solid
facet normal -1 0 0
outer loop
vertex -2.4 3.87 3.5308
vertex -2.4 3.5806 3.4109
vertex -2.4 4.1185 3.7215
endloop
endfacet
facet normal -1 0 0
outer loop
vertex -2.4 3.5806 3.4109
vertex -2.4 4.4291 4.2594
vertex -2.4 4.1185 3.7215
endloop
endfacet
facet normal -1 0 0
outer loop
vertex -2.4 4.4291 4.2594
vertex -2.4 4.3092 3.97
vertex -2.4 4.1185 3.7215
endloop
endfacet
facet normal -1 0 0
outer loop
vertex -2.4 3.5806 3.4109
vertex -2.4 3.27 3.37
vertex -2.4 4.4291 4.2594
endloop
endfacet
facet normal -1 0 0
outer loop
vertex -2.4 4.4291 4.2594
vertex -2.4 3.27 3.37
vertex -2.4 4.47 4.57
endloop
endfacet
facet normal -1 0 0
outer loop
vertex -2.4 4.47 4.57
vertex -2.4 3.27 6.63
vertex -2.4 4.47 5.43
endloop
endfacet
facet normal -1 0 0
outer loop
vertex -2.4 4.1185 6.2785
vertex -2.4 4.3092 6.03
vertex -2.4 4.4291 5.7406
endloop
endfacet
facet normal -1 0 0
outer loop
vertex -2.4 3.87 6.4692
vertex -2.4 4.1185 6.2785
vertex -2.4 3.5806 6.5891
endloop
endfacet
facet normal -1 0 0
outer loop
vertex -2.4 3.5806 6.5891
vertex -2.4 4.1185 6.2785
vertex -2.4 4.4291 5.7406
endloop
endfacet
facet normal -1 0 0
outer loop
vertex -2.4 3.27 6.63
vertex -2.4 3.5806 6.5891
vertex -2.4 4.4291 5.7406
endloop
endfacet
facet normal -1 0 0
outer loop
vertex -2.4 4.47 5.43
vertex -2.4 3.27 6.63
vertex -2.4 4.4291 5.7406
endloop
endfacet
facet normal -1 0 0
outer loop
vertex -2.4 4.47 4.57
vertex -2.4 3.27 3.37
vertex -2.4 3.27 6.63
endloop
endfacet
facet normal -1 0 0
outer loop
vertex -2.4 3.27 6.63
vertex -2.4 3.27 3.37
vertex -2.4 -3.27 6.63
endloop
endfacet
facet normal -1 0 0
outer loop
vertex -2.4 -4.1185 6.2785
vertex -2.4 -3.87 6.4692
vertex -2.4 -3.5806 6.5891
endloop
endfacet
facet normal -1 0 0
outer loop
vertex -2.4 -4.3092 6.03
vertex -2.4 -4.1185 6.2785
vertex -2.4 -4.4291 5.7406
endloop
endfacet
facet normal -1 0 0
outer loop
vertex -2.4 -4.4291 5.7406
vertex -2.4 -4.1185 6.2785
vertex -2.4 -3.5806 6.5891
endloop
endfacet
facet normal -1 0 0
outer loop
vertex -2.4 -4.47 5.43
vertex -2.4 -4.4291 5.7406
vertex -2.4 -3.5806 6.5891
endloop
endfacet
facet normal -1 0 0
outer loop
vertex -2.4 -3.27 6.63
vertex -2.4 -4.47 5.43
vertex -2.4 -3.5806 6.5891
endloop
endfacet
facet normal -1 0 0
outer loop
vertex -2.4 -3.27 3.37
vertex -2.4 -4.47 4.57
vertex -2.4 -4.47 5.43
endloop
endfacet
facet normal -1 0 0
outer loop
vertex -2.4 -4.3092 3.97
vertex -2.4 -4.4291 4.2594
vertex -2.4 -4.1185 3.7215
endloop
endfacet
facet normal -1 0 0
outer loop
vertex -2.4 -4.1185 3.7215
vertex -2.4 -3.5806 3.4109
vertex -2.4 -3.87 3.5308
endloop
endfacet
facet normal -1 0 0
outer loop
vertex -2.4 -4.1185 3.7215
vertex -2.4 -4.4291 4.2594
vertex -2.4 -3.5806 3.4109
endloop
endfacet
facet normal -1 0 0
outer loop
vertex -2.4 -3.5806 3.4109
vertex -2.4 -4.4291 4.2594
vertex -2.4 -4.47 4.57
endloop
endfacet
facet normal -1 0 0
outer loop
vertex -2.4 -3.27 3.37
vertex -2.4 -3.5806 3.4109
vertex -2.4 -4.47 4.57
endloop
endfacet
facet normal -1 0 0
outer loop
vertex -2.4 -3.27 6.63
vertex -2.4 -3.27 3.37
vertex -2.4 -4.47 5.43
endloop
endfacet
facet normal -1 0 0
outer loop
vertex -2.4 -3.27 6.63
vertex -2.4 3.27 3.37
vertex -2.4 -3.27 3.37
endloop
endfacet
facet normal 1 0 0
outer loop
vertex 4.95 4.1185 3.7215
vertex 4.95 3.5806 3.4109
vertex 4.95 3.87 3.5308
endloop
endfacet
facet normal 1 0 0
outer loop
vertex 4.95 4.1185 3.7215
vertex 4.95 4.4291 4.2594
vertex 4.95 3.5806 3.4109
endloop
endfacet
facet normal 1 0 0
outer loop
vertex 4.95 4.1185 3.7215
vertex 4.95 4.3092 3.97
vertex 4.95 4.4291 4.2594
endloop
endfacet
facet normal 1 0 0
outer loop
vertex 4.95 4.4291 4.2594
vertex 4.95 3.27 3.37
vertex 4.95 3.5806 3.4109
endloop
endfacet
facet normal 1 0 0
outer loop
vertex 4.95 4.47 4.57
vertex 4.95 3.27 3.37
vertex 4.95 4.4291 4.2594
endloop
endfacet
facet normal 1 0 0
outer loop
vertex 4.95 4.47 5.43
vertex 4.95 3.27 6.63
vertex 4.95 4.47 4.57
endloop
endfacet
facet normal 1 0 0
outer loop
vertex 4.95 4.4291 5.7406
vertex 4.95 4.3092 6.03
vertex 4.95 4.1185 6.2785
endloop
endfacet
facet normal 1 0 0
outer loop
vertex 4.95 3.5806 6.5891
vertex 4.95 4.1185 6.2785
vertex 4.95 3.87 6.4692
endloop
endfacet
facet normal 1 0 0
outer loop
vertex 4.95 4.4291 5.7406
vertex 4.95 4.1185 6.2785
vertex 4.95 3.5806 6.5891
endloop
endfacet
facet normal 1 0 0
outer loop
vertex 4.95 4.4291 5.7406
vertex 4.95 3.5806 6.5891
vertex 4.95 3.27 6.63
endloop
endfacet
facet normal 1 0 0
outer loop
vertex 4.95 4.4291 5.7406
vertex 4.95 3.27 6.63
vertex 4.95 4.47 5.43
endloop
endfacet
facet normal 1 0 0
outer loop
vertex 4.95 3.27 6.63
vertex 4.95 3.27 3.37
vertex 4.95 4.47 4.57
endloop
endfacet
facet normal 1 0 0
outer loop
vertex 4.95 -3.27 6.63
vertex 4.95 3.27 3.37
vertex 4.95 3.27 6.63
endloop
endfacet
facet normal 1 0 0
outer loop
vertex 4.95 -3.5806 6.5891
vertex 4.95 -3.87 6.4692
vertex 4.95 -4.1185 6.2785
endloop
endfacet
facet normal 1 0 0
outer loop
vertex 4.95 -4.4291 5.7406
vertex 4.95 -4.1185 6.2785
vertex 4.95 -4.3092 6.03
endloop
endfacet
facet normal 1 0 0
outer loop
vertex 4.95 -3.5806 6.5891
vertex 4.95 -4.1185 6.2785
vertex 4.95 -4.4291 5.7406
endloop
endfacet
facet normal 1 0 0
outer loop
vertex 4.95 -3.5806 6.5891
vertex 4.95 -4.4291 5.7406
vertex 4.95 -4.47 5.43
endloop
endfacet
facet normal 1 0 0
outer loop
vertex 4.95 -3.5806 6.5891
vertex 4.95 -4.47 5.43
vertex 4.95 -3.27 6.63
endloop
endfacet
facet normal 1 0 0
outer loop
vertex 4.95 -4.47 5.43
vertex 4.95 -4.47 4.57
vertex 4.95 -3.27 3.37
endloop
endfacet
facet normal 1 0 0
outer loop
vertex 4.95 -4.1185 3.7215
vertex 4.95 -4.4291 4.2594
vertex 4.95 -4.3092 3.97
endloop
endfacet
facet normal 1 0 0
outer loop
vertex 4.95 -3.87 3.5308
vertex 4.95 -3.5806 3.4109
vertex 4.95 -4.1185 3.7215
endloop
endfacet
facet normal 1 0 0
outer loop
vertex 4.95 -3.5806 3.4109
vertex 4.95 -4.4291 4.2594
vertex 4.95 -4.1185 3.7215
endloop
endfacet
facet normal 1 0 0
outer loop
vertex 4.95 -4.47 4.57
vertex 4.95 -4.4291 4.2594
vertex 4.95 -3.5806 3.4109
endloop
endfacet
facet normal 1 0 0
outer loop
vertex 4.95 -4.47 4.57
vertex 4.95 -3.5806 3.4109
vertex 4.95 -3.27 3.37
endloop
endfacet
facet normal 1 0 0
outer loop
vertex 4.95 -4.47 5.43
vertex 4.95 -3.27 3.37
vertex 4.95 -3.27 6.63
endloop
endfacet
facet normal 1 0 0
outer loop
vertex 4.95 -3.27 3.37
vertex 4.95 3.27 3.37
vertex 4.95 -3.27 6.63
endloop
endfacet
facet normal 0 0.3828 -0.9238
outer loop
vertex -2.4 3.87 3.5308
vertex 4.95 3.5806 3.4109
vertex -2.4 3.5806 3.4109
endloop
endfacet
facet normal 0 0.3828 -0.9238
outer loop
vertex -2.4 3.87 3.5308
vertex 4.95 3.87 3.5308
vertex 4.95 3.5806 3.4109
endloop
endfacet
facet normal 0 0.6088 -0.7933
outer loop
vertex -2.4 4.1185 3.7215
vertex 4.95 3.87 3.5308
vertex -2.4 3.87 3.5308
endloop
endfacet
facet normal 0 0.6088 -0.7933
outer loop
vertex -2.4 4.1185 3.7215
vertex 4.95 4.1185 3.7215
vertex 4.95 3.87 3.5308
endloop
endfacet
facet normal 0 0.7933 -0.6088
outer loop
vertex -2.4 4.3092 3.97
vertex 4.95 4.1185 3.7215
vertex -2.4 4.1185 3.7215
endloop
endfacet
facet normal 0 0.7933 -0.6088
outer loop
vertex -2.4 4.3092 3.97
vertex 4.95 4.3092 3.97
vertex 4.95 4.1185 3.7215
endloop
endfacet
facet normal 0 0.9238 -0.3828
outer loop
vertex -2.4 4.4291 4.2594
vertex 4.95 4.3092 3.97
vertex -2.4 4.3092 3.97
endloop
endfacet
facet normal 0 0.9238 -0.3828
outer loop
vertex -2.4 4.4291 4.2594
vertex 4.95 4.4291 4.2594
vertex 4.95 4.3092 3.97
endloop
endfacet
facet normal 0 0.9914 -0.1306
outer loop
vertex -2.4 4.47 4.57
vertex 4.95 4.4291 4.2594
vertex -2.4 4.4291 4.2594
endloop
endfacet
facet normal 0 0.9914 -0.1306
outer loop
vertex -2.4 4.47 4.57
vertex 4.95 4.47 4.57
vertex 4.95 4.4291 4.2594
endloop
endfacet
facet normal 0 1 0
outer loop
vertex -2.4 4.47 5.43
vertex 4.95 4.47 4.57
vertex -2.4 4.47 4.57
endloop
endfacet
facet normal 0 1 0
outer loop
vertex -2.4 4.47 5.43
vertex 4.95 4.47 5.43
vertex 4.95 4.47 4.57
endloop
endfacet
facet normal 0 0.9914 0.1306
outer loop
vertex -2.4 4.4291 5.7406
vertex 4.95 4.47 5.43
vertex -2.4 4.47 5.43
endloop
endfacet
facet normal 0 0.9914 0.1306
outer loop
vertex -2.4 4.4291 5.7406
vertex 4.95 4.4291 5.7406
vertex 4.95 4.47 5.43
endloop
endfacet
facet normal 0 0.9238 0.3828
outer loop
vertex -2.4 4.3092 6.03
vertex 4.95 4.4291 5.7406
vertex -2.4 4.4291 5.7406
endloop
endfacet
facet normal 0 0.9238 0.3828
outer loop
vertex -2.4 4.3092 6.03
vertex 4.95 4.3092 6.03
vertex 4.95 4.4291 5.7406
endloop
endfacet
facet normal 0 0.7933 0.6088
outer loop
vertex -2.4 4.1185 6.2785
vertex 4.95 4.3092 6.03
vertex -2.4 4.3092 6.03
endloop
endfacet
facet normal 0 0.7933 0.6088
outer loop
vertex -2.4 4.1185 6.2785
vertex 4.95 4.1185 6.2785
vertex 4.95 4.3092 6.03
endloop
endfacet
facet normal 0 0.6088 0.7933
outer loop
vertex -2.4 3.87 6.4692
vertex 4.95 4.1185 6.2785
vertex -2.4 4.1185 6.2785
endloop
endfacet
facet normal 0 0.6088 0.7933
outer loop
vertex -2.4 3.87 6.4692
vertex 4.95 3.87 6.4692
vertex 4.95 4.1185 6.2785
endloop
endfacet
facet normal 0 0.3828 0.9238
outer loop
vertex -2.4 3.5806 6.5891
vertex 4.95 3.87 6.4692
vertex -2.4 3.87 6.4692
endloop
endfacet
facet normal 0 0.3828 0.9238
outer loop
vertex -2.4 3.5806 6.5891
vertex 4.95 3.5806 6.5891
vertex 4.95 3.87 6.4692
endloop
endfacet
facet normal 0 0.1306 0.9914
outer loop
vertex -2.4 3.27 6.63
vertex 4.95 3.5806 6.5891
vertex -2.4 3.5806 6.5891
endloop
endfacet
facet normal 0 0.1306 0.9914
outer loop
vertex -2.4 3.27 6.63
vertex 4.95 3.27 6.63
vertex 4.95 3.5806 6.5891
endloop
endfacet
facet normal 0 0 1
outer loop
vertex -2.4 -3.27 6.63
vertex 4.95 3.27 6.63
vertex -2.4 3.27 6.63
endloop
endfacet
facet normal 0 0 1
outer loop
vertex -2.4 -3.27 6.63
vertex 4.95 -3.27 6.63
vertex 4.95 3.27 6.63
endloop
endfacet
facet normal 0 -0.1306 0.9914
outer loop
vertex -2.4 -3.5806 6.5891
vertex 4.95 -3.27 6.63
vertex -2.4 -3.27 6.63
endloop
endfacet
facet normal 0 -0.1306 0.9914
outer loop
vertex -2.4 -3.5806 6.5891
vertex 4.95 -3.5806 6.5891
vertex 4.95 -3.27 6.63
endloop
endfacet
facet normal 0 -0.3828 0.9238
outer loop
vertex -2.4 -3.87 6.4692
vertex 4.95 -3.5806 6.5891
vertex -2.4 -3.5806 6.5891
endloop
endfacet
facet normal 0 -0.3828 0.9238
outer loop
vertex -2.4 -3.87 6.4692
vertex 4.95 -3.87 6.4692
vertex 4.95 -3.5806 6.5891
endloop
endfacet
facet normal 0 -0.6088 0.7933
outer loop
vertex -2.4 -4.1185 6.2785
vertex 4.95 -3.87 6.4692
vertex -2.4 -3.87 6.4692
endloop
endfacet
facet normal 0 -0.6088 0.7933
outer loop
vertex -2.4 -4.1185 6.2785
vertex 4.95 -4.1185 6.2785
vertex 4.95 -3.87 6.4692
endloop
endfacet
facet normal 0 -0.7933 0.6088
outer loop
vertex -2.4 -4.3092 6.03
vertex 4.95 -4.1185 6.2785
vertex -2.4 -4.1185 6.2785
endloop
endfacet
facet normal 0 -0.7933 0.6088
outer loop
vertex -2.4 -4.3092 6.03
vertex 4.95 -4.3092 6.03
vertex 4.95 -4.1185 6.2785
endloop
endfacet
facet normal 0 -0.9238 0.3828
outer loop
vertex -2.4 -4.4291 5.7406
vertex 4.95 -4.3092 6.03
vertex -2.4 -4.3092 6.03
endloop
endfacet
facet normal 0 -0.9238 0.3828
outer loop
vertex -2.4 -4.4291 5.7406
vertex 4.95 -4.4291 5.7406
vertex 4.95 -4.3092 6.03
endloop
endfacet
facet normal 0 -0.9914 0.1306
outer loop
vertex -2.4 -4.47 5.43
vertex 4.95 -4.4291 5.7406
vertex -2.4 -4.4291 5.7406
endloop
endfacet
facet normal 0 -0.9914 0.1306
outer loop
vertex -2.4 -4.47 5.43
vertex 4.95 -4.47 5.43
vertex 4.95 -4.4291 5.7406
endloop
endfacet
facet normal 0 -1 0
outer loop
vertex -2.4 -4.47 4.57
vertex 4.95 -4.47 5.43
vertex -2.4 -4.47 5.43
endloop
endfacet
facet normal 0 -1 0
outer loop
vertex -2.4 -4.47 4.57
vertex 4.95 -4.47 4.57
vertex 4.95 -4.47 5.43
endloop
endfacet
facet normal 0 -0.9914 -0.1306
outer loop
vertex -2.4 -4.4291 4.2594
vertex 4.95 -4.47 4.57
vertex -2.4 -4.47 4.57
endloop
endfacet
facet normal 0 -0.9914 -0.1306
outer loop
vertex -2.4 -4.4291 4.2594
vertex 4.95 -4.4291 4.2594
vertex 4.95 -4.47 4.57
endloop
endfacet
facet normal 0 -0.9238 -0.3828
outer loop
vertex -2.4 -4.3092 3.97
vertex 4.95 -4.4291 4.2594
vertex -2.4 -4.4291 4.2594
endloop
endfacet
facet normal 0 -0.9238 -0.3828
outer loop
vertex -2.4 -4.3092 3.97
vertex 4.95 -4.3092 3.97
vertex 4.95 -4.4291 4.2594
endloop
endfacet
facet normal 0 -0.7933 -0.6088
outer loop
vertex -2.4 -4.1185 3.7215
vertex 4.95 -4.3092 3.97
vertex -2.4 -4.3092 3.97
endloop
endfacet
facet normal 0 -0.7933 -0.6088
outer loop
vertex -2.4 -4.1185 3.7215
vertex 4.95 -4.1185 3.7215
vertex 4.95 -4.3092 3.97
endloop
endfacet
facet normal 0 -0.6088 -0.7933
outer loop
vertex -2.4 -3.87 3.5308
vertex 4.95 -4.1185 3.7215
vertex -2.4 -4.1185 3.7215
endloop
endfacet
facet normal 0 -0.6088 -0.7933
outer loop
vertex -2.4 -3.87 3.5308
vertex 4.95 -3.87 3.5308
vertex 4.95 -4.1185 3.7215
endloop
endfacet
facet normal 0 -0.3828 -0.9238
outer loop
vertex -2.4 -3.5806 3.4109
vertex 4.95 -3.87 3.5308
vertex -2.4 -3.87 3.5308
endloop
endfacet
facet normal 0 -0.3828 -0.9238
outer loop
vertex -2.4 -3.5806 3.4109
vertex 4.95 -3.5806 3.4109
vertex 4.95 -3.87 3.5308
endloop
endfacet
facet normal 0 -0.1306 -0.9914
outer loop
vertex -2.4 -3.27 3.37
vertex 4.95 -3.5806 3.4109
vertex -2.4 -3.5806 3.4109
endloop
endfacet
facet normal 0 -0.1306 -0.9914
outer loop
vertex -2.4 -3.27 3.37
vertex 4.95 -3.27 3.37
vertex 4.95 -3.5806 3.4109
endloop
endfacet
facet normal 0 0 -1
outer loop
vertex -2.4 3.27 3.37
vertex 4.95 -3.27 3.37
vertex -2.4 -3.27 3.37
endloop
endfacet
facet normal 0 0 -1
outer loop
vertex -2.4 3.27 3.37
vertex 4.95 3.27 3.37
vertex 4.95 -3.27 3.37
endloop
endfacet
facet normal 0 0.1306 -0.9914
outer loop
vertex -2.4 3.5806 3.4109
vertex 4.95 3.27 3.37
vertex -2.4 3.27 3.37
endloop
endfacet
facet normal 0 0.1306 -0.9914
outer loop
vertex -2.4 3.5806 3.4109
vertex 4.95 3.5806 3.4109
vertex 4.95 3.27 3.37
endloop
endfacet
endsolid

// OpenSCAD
// file: ../usb-c-port.scad
//-----------------------------------------------------------------------
// USB-C port through a wall, flush: the socket's metal shell sits in a
// close-fitting pocket in the wall, walled in on all four sides, its face
// level with the outside. The cable seats the way it does on a laptop.
//
// A board's socket only overhangs the board edge by a mm or so, less than
// the wall. So the board's end tucks into a shallow relief in the wall's
// inner face, the width of the board, leaving the wall round the socket
// thin enough for the face to reach the outside. When that would leave less
// than usbcMinWall (a socket that barely overhangs), the face sits back from
// the outside instead: usbcRecess() says how far.
//
// Modules, all in the same frame:
//   usbcGhost()     the socket and the board's end, for previews
//   usbcWallCut()   subtract from the wall: socket pocket and board relief
//
// Frame: origin on the floor top at the wall's inner face, under the socket's
// axis. +X into the box, Z up. The wall is X = -wall .. 0. The board is
// component side up, socket on top (top-mount, as on the FireBeetle, C3 Super
// Mini and S3 DevKitC). Units: mm.
//
// usbcBoardEdgeX() gives where the board's edge lands (negative: inside the
// wall), so a holder can put its posts or pocket to match.
//-----------------------------------------------------------------------

//-- The socket: USB-C receptacle shell (USB-IF 8.34 x 2.56 plug, receptacle shell ~8.94 x 3.26)
usbcShellW     = 8.94;
usbcShellH     = 3.26;    // CAL per board: measured 3.2 on the FireBeetle
usbcShellR     = 1.2;     // CAL: end radius. Full round would be 1.63; most shells are squarer
usbcShellDepth = 7.35;    // face to back

//-- The pocket
usbcClearance  = 0.15;    // CAL: per side, shell to pocket. Set by the fit piece
usbcMinWall    = 1.0;     // thinnest wall left round the socket
usbcReliefGap  = 0.3;     // board relief over the board, each side and above/below
usbcChamfer    = 0.3;     // lead-in on the outside edge

//-- How far the socket face sits back from the outside: 0 (flush) unless the socket
//-- overhangs the board edge by less than usbcMinWall
function usbcRecess(overhang, minWall = usbcMinWall) = max(0, minWall - overhang);
//-- X of the board's socket edge in this frame
function usbcBoardEdgeX(wall, overhang, recess) =
  -wall + (is_undef(recess) ? usbcRecess(overhang) : recess) + overhang;
//-- Z of the board's underside above the floor top
function usbcBoardZ(axisZ, pcb, shellH = usbcShellH) = axisZ - shellH/2 - pcb;

module usbcShell2D(grow = 0, w = usbcShellW, h = usbcShellH, r = usbcShellR)
{
  offset(r = r + grow, $fn = 24) square([w - 2*r, h - 2*r], center = true);
}

//-- axisZ: socket axis above the floor. boardW/pcb: the board, for the ghost and relief.
//-- shift: socket centre across the board's width from the board's centre line (+Y)
module usbcGhost(axisZ, wall, overhang, boardW, pcb = 1.6, recess, shift = 0, shellH = usbcShellH, shellW = usbcShellW)
{
  ex = usbcBoardEdgeX(wall, overhang, recess);
  %color("Silver") translate([ex - overhang, 0, axisZ]) rotate([0, 90, 0]) rotate([0, 0, 90])
    linear_extrude(usbcShellDepth) usbcShell2D(w = shellW, h = shellH);
  %color("DarkSlateGray") translate([ex, -boardW/2 - shift, usbcBoardZ(axisZ, pcb, shellH)]) cube([12, boardW, pcb]);
}

module usbcWallCut(axisZ, wall, overhang, boardW, pcb = 1.6, recess, shift = 0,
                   clearance = usbcClearance, shellH = usbcShellH, shellW = usbcShellW, aboveBoard)
{
  rc = is_undef(recess) ? usbcRecess(overhang) : recess;
  ex = usbcBoardEdgeX(wall, overhang, rc);
  bz = usbcBoardZ(axisZ, pcb, shellH);
  //-- what stands on the board near its edge: the socket, unless told taller
  up = is_undef(aboveBoard) ? shellH : aboveBoard;
  assert(ex - overhang + wall >= -0.01, "socket face would stand proud of the wall");
  assert(rc > 0 || overhang >= usbcMinWall - 0.01, "wall round the socket under usbcMinWall");
  //-- socket pocket, through the wall
  translate([-wall - 1, 0, axisZ]) rotate([0, 90, 0]) rotate([0, 0, 90])
    linear_extrude(wall + 2) usbcShell2D(clearance, w = shellW, h = shellH);
  //-- lead-in chamfer on the outside
  translate([-wall, 0, axisZ]) rotate([0, 90, 0]) rotate([0, 0, 90])
    hull()
    {
      translate([0, 0, -0.01]) linear_extrude(0.01) usbcShell2D(clearance + usbcChamfer, w = shellW, h = shellH);
      translate([0, 0, usbcChamfer]) linear_extrude(0.01) usbcShell2D(clearance, w = shellW, h = shellH);
    }
  //-- board relief in the inner face, when the board's edge lands inside the wall
  if (ex < 0)
    translate([ex - usbcReliefGap, -boardW/2 - shift - usbcReliefGap, bz - usbcReliefGap])
      cube([-ex + usbcReliefGap + 1, boardW + 2*usbcReliefGap, pcb + up + 2*usbcReliefGap]);
}
// main file
// The socket and the board's end as solids, for the catalogue.
include <../usb-c-port.scad>

wall = 2.4; overhang = 1.47; boardW = 25.4; pcb = 1.6; axisZ = 5;
ex = usbcBoardEdgeX(wall, overhang);
translate([ex - overhang, 0, axisZ]) rotate([0, 90, 0]) rotate([0, 0, 90]) linear_extrude(usbcShellDepth) usbcShell2D();
